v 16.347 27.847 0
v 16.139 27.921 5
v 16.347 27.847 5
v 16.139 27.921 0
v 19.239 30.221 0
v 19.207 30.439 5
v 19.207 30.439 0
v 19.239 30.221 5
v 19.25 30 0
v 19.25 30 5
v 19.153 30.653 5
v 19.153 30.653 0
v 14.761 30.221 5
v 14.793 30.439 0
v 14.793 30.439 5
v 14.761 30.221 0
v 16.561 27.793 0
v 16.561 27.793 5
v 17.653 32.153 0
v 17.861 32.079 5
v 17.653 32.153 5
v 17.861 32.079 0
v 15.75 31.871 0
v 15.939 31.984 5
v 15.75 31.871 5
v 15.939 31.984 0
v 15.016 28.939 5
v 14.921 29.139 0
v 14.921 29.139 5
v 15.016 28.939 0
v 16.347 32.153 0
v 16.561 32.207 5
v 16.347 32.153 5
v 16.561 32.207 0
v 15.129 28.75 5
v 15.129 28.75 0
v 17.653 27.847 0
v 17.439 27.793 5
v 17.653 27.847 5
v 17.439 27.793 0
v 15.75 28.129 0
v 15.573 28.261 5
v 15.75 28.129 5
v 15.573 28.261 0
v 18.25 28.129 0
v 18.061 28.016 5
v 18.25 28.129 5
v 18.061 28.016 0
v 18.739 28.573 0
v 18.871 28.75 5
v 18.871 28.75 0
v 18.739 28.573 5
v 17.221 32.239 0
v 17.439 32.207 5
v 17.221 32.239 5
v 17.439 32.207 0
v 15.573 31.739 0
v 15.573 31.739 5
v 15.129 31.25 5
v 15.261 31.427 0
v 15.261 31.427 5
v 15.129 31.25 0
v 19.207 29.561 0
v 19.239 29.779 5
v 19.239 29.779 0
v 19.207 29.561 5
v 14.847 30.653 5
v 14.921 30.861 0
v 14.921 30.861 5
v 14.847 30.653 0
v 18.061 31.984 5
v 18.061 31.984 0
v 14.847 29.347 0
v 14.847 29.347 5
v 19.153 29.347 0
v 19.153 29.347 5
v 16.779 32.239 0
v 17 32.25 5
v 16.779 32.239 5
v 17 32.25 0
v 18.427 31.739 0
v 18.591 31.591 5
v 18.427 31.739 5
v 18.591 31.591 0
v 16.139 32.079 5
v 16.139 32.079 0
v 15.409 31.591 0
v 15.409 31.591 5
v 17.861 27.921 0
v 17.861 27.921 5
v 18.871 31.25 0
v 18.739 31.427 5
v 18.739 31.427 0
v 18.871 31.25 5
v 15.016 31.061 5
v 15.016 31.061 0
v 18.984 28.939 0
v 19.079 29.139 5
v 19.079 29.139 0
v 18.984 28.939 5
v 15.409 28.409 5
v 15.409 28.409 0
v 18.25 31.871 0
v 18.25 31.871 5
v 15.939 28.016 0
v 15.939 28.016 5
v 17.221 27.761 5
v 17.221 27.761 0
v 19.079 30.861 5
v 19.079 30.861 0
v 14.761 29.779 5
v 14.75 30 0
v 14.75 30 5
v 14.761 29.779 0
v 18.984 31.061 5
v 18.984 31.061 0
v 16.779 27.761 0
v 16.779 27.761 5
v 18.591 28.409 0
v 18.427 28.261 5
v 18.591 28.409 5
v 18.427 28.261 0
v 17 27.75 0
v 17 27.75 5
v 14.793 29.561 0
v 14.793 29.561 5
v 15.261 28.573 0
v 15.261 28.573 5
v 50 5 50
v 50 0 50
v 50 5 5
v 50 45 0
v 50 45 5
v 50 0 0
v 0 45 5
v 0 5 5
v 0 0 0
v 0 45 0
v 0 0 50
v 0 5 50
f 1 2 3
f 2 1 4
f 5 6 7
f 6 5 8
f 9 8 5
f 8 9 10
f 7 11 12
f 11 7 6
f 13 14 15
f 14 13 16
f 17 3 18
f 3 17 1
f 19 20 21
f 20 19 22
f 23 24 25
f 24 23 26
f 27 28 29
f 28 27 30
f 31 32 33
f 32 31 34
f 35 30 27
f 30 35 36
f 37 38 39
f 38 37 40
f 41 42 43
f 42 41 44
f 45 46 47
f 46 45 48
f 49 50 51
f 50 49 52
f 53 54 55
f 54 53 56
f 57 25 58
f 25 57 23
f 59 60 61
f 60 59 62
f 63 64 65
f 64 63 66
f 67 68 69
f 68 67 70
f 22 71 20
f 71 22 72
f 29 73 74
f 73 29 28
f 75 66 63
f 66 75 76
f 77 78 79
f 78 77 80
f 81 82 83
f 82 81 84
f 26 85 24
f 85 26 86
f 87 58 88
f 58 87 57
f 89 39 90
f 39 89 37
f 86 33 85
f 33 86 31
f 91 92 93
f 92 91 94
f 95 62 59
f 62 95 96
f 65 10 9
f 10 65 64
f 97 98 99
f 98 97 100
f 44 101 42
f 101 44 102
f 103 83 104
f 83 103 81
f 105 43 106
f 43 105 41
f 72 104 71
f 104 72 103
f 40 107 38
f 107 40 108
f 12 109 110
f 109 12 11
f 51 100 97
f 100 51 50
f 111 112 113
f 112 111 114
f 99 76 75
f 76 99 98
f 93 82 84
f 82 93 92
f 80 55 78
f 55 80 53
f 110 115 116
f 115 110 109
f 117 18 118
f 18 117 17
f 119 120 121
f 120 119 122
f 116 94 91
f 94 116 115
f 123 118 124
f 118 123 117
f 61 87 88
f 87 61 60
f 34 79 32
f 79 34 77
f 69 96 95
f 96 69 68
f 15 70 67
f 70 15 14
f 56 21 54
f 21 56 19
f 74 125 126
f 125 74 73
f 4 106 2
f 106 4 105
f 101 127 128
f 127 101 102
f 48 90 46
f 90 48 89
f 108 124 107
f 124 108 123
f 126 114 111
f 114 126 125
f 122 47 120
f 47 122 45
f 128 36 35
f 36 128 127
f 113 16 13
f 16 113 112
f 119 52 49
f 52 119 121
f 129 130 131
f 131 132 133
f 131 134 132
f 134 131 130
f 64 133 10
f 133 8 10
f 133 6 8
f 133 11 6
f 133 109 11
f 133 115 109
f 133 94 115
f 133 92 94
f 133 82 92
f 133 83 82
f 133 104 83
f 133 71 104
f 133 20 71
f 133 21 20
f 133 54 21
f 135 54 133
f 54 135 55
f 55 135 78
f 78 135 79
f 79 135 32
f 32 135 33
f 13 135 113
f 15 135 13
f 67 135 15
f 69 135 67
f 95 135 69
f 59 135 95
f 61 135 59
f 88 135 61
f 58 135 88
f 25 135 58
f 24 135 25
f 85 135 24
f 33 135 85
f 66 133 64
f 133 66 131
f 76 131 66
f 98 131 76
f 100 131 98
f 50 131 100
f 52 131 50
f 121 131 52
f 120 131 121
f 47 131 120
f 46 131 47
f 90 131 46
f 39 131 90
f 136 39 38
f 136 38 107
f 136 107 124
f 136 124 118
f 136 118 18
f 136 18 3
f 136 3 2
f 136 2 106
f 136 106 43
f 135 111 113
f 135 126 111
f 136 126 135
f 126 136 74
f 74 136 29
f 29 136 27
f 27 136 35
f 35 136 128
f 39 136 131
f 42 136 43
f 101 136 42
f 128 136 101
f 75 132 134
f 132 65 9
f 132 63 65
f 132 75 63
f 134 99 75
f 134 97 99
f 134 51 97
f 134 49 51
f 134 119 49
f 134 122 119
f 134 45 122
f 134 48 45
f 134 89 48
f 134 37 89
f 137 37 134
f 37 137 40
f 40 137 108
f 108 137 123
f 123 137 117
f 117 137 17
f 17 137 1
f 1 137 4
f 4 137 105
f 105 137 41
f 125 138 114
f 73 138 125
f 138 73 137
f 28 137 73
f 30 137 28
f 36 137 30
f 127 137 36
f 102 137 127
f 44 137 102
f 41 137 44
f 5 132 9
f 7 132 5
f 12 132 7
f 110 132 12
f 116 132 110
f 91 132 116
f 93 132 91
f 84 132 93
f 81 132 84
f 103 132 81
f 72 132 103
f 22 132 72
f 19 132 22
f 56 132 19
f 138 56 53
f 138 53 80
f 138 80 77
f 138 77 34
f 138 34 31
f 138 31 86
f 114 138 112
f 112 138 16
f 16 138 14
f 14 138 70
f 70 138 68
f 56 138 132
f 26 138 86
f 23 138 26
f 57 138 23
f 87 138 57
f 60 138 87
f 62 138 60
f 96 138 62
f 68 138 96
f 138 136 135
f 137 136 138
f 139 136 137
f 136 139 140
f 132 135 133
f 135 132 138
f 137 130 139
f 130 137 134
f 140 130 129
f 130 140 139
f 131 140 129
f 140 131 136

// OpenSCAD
// NEMA 17 Stepper Motor Mounting Bracket for Syringe Pump
// Units: mm

// --- Base Plate Dimensions ---
base_x_half = 25;      // Half-width of base plate (x: -25 to 25)
base_y_len = 45;       // Length of base plate (y: 0 to 45)
base_z_thick = 5;      // Thickness of base plate (z: 0 to 5)

// --- Motor Mounting Plate Dimensions ---
motor_plate_x_half = 25; // Width of vertical plate (x: -25 to 25)
motor_plate_y_thick = 5; // Thickness of vertical plate (y: 0 to 5)
motor_plate_z_height = 50; // Height of vertical plate (z: 0 to 50)

// --- Hole Dimensions ---
hole_m4_dia = 4.5;     // Diameter for M4 mounting holes
hole_m3_dia = 3.4;     // Diameter for M3 screw holes
hole_boss_dia = 23;    // Diameter for motor centring boss

// --- Hole Positions ---
// M4 Holes on base plate
m4_hole_x = 17;
m4_hole_y = 30;

// M3 Holes on motor plate (31mm square pattern)
m3_pattern_half = 31 / 2; // 15.5 mm from center

// Boss Hole Center
boss_center_x = 0;
boss_center_z = 28;

// --- Gusset Dimensions ---
gusset_thick = 5;      // Thickness of gusset (along Y)
gusset_leg_y = 20;     // Leg length along +Y
gusset_leg_z = 20;     // Leg length along +Z
// Right angle corner at y=5, z=5.
// Triangle vertices in the YZ plane: (y=5, z=5), (y=25, z=5), (y=5, z=25)

// --- Extrusion Depth for Boolean Operations ---
cut_depth = 1.0;       // Extra depth to ensure clean cuts

// --- Module: Base Plate ---
module base_plate() {
    // Main block
    difference() {
        cube([base_x_half * 2, base_y_len, base_z_thick], center = false);
        
        // M4 Holes
        // Extend hole depth past the bottom (z=0) and top (z=5)
        for (i = [-1, 1]) {
            $fn = 64;
            translate([i * m4_hole_x, m4_hole_y, -cut_depth]) {
                cylinder(d = hole_m4_dia, h = base_z_thick + 2 * cut_depth, center = false);
            }
        }
    }
}

// --- Module: Motor Plate ---
module motor_plate() {
    // Main block
    difference() {
        cube([motor_plate_x_half * 2, motor_plate_y_thick, motor_plate_z_height], center = false);
        
        // Boss Hole (along Y axis)
        // Center at x=0, z=28. Extends through the plate (y: 0 to 5).
        // Extend past faces y=0 and y=5.
        $fn = 64;
        translate([boss_center_x, -cut_depth, boss_center_z]) {
            // Cylinder axis is Y by default if not specified, but explicit is better.
            // However, OpenSCAD cylinder axis is Z by default. 
            // To cut along Y, we can rotate the cylinder or use a different approach.
            // Using rotate to align Z axis of cylinder to Y axis of world.
            rotate([90, 0, 0]) {
                cylinder(d = hole_boss_dia, h = motor_plate_y_thick + 2 * cut_depth, center = false);
            }
        }
        
        // M3 Screw Holes (along Y axis)
        // 31mm square pattern centered on boss hole (x=0, z=28)
        // Holes at x = +/- 15.5, z = 28 +/- 15.5
        for (ix = [-1, 1]) {
            for (iz = [-1, 1]) {
                $fn = 64;
                translate([ix * m3_pattern_half, -cut_depth, boss_center_z + iz * m3_pattern_half]) {
                    rotate([90, 0, 0]) {
                        cylinder(d = hole_m3_dia, h = motor_plate_y_thick + 2 * cut_depth, center = false);
                    }
                }
            }
        }
    }
}

// --- Module: Gusset ---
module gusset(side) {
    // Side is -1 for left, 1 for right.
    // Right angle corner at y=5, z=5.
    // Legs: +20 in Y, +20 in Z.
    // Triangle vertices in YZ plane: (5,5), (25,5), (5,25)
    
    // X extent:
    // Left: -25 to -20
    // Right: 20 to 25
    x_start = (side == -1) ? -25 : 20;
    x_end = (side == -1) ? -20 : 25;
    
    // Create the 3D gusset by extruding the 2D triangle along X
    linear_extrude(height = x_end - x_start, center = false, convexity = 10) {
        polygon(points = [
            [5, 5],
            [25, 5],
            [5, 25]
        ]);
    }
}

// --- Main Assembly ---
union() {
    // Base Plate
    base_plate();
    
    // Motor Plate (standing on the back edge of the base)
    // Base is z=0..5. Motor plate sits on y=0..5, z=0..50.
    // The motor plate's bottom face (z=0) aligns with the base's bottom face?
    // "standing on the back edge of the base" usually implies the motor plate's 
    // bottom face is at z=0, and its back face is at y=0, aligned with the base's back face.
    // Let's assume the motor plate's bottom is at z=0, same as the base.
    // The motor plate occupies y: 0..5, z: 0..50.
    // The base occupies y: 0..45, z: 0..5.
    // They overlap in y: 0..5, z: 0..5. This is correct for a union.
    motor_plate();
    
    // Left Gusset
    gusset(-1);
    
    // Right Gusset
    gusset(1);
}
